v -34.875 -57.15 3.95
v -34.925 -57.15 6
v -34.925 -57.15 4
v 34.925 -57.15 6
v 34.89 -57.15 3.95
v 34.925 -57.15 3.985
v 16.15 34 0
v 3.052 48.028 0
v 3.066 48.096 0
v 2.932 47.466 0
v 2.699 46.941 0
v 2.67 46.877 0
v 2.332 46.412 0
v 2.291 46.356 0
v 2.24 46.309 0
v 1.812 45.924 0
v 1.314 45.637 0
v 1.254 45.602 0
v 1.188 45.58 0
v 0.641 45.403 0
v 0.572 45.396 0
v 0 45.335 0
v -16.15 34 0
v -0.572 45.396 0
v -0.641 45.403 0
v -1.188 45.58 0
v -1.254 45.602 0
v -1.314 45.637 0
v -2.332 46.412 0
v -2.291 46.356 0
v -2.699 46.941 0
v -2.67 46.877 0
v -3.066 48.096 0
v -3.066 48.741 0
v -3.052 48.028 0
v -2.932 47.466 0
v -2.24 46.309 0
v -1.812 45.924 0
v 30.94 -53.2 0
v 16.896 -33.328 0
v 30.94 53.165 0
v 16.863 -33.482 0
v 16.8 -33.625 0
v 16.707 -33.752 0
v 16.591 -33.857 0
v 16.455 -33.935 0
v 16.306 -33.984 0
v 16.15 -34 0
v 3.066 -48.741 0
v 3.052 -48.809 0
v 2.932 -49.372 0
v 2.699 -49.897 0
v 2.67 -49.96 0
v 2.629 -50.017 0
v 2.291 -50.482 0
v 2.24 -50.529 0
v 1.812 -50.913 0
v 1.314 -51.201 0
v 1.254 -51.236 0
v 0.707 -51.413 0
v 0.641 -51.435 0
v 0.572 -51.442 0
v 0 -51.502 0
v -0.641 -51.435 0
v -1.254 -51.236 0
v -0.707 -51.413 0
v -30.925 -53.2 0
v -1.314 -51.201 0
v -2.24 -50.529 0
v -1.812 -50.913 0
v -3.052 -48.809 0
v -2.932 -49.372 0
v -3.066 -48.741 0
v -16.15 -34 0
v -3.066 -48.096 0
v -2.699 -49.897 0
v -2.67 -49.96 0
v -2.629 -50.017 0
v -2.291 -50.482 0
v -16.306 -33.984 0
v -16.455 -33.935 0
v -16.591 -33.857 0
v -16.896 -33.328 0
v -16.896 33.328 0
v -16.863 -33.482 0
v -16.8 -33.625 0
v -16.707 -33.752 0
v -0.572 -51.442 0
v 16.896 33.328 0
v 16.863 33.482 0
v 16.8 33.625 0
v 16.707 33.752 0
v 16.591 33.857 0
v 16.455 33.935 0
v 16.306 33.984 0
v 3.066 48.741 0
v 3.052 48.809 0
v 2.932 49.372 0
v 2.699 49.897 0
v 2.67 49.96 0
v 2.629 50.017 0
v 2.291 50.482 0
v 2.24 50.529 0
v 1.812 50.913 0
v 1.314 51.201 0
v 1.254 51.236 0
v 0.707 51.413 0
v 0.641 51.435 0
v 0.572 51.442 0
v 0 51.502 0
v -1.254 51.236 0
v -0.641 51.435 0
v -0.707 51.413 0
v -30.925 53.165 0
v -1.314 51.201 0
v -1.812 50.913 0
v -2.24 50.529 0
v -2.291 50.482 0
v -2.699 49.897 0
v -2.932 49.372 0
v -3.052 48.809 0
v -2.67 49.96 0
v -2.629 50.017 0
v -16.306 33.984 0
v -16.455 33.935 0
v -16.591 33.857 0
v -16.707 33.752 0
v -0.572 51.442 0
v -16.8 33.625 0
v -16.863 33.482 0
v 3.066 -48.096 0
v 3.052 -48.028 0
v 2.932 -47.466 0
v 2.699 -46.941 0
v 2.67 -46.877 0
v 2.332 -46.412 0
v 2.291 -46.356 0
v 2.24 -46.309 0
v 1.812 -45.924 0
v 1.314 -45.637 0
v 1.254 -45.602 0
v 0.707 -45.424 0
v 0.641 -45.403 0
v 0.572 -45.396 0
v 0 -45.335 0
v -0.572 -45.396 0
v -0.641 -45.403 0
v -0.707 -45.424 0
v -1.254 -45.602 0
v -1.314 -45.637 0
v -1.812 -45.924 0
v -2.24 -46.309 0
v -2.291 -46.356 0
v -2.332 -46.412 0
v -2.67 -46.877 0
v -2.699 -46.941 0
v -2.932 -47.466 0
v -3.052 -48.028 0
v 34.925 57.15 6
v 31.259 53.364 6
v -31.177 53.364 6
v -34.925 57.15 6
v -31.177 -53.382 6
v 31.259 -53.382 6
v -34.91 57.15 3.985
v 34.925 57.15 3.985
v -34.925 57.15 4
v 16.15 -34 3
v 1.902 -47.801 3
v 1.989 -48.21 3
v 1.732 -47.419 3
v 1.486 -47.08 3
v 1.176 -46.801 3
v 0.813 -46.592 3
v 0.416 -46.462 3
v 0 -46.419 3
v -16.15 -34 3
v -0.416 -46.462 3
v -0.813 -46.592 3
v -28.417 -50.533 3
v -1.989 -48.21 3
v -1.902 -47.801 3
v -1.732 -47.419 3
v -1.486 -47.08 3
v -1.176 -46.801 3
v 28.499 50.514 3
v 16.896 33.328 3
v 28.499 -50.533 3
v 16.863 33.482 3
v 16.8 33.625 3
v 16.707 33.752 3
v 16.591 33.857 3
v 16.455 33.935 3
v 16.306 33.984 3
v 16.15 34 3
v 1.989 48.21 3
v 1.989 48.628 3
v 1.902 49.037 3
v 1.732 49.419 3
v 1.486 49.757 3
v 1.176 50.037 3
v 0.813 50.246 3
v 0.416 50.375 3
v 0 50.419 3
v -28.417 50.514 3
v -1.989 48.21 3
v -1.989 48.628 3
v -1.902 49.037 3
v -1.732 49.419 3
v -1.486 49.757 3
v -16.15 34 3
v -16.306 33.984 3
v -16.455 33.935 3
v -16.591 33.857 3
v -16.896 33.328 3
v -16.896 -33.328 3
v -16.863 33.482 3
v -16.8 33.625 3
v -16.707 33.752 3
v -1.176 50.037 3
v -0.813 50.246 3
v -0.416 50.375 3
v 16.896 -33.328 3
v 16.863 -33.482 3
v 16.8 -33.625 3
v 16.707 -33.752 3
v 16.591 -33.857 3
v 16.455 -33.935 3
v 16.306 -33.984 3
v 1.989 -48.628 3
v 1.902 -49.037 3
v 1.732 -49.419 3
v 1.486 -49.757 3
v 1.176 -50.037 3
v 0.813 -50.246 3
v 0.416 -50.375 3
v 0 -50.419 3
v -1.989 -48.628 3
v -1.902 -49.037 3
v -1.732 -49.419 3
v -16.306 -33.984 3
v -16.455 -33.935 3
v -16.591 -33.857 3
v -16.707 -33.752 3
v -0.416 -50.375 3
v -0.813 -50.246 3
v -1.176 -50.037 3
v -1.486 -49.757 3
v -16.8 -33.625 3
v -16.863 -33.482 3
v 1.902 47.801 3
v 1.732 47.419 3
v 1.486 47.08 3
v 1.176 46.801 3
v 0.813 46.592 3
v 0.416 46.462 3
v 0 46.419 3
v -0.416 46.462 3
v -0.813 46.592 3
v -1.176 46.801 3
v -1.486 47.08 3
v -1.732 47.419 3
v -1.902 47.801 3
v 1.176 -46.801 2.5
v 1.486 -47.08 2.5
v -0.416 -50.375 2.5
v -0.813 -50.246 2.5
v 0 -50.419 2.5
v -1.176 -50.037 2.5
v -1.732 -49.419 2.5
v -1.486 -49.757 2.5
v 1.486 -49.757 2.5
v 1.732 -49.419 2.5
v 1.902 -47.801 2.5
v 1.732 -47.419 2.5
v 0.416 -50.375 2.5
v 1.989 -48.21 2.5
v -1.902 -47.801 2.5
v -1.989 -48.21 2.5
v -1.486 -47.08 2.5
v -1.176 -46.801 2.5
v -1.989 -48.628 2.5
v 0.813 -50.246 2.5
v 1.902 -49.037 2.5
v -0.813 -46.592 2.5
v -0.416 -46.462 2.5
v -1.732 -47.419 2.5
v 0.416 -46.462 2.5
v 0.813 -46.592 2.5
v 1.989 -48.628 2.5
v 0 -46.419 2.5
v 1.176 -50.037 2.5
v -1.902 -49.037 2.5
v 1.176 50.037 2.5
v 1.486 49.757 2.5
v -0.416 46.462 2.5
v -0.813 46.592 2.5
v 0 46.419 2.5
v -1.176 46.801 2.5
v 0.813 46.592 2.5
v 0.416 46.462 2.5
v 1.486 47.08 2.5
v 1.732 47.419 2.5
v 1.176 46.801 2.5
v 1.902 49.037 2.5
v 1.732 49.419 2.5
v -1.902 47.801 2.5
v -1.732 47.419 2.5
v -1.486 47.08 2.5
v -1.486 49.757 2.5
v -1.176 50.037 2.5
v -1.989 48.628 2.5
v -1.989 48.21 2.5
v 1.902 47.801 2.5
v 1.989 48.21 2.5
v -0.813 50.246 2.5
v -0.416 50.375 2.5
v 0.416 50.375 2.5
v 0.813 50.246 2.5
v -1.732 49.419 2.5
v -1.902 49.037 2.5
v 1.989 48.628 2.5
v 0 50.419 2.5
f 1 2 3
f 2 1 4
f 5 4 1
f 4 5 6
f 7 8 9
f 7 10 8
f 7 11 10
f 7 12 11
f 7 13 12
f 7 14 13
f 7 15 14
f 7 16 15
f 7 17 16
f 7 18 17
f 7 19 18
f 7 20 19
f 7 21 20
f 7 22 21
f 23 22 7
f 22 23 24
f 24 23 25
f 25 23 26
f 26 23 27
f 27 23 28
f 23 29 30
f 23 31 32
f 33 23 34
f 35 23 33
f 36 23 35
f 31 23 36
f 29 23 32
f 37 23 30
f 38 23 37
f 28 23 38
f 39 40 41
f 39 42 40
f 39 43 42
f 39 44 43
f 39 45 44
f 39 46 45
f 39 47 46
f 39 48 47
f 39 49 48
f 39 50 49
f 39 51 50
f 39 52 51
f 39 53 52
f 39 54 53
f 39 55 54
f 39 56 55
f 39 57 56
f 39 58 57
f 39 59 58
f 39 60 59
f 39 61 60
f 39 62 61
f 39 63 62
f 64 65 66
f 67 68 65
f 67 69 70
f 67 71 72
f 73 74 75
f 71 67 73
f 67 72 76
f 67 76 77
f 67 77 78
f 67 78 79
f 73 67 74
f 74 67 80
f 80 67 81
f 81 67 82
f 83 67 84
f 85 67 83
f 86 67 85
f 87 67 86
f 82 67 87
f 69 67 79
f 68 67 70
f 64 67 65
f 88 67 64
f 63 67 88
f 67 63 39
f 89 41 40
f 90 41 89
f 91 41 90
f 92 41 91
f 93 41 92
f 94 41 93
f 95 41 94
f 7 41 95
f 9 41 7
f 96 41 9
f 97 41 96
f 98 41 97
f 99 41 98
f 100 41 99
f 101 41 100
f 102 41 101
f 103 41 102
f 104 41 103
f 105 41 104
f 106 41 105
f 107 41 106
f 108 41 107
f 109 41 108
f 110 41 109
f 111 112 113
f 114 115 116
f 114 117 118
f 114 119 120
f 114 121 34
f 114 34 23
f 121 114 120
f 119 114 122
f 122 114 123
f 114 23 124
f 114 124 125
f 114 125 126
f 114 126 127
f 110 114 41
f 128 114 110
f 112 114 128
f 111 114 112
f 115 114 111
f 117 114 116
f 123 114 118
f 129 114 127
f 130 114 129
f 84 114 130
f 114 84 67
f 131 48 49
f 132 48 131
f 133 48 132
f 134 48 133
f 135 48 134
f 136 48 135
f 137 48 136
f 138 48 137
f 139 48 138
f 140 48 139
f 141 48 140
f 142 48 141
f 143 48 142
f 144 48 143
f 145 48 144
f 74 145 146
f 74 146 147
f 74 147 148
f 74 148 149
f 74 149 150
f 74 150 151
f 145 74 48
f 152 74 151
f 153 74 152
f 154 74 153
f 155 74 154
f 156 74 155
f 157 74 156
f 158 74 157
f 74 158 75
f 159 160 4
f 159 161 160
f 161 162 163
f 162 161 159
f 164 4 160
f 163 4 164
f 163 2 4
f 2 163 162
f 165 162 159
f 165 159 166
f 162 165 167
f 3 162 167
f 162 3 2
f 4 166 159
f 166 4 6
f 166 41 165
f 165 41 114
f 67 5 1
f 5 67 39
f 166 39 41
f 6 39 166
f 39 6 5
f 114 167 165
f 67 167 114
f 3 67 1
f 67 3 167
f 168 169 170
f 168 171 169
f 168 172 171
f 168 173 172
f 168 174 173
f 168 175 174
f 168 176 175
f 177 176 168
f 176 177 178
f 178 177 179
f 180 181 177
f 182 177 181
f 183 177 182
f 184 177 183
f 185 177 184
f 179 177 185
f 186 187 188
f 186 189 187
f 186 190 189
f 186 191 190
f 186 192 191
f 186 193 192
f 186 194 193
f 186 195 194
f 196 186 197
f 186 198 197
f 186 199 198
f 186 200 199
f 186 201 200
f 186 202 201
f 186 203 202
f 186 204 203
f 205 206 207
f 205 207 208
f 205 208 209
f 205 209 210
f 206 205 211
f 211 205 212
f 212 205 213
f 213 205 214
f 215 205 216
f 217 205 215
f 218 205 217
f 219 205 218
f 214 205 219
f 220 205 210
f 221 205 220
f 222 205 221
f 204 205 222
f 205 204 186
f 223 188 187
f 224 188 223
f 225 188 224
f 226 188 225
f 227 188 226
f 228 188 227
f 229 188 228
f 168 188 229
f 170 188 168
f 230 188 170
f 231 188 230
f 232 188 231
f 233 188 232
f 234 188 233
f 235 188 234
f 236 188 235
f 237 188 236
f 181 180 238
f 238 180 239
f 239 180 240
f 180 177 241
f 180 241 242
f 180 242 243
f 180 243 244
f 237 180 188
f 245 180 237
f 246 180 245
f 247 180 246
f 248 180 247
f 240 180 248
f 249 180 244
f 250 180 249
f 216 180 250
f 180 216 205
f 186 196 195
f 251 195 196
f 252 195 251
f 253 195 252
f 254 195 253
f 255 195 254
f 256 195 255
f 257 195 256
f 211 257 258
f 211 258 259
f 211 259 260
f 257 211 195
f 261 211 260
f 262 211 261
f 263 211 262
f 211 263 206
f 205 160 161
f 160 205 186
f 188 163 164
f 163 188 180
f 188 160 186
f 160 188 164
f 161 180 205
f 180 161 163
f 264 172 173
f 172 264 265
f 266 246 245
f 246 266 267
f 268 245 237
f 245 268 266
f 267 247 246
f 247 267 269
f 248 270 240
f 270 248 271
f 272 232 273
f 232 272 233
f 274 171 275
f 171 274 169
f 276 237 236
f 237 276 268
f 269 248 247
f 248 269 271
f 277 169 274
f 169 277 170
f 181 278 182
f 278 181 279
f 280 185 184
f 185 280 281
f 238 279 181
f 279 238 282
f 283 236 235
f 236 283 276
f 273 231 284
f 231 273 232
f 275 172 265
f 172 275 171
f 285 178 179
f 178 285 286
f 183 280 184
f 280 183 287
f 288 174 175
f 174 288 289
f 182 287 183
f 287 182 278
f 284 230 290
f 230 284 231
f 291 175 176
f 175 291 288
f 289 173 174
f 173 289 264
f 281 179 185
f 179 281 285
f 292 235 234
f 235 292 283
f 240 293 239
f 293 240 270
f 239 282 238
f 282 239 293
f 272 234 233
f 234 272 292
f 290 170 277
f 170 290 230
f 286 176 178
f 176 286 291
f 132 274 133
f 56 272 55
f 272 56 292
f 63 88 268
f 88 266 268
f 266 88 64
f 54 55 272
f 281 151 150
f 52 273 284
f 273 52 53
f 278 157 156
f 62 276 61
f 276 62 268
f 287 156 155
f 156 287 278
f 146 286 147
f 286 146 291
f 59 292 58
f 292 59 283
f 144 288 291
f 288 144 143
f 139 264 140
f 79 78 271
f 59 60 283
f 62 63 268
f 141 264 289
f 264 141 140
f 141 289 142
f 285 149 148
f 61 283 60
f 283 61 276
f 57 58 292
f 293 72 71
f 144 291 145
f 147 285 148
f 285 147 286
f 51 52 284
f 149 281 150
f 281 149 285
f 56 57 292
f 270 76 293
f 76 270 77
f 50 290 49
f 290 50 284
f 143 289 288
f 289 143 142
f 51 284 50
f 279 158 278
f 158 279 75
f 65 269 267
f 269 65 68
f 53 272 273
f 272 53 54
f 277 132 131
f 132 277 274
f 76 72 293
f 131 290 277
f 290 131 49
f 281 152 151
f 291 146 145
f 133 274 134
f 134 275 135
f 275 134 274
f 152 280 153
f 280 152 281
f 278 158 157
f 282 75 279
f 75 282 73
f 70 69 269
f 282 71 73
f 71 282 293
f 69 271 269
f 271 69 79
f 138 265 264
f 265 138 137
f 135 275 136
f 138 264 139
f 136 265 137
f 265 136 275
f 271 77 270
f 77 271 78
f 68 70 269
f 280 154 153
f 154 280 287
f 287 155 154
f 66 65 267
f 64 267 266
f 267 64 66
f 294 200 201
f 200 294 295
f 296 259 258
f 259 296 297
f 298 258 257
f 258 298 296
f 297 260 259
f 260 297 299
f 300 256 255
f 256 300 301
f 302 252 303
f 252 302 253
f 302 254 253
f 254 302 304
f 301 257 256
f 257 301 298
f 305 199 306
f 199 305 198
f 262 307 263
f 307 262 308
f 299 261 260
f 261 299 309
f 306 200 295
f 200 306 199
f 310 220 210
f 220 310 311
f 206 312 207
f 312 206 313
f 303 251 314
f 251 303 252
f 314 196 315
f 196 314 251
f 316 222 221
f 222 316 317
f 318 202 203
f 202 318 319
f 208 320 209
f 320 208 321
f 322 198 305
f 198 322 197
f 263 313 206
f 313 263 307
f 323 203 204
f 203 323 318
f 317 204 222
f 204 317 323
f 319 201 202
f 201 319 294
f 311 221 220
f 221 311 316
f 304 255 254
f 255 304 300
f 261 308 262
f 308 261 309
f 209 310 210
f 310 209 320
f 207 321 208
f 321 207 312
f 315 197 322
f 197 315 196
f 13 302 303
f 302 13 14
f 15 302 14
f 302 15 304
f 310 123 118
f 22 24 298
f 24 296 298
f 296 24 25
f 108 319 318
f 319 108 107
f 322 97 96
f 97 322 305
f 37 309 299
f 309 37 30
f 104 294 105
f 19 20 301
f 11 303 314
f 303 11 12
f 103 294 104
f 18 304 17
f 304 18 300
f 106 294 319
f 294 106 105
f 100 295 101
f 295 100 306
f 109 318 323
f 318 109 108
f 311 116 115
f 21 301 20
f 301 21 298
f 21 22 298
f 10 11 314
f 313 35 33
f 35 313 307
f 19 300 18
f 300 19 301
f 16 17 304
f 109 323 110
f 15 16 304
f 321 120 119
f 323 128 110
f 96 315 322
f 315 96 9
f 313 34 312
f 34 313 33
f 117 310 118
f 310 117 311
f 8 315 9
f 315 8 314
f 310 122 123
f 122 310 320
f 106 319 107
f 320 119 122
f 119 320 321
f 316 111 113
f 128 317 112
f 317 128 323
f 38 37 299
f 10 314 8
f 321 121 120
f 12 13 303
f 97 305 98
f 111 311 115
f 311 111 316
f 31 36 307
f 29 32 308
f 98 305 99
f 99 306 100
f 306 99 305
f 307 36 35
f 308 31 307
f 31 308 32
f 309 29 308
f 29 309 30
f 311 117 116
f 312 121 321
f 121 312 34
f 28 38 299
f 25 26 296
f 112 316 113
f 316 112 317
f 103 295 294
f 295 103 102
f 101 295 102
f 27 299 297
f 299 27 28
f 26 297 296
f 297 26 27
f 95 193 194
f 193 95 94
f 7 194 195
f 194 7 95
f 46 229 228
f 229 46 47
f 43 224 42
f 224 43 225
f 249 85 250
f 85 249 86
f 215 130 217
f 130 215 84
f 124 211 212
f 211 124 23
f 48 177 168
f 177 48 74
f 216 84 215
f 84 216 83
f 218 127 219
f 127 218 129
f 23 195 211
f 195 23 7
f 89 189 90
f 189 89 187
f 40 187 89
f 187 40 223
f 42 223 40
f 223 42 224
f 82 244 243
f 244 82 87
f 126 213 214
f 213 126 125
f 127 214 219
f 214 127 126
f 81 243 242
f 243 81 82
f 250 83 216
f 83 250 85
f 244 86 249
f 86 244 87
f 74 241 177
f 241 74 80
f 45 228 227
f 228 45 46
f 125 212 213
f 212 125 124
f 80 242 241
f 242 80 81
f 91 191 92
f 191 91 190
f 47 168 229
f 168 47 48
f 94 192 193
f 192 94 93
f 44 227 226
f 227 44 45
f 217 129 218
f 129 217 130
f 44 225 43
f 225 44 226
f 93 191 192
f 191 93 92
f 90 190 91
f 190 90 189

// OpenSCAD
// WALLY - Wall Plate Customizer v1.4
// by TheNewHobbyist 2013 (http://thenewhobbyist.com)
// http://www.thingiverse.com/thing:47956
//
// Most of the connectors used with this thing are panel mount connectors from
// www.DataPro.net I can't vouch for their quality but they did have easy to
// find dimensions for their products so I used them.
//
// This could be tightened up considerably but I thought I'd get it out there for people
// to experiment with before I lose my mind staring at it too long. Also this is my
// first OpenSCAD model so cut me some slack ;)
//
//   Notes:
//
// * The plug types "Duplex Outlet", "Long_Toggle Switch", "Toggle Switch", and "Rocker"
//   will all use the entire plate when selected in top or bottom configuration. The
//   other selection (if not "none" will be selected).
//
// * "None" and "Blank should not be considered equal. if "None" is selected for one of
//   the two holes on a plate the other selection will be centered on that plate. If
//   "Blank" is selected that plug location will remain blank but the other selection
//   will NOT move into a centered position.
//
//	Change Log:
//
//	v1.1
//	UPDATED: Screw hole locations for designer and toggle plate types.
//	UPDATED: Hole size for designer plate type.
//	UPDATED: Outlet hole spacing
//
//	v1.2
//	ADDED: Long Toggle Switch for laird
//
//	v1.3
//	ADDED: 3 new sizes for plate export: Standard, Junior-Jumbo, and Jumbo.
//
//	v1.3a
//	ADDED: Keystone jack pair
//
//	v1.3b
//	ADDED: whole-plate 2x3 array of Keystone jacks
//
//  v1.4 by rssalerno
//  ADDED: 1x3 array of Keystone jacks
//  FIXED: bugs in plates 4 and 5
//
//  v1.41.1 by rssalerno
//  UPDATED: cleaned up a bit
//  UPDATED: revised keystone frame for easier insertion, same frame now used for all configurations
//  ADDED: keystone clearance parameter to adjust fit
//  UPDATED: adjusted keystone column spacing, now distributes evenly across 2+ gangs
//  UPDATED: changed rocker opening to rounded rectangle

  //////////////////////////
 // Customizer Settings: //
//////////////////////////

//How big are we talkin' here?
plate_width = 1; //	[1:5]

// Bigger hole in your wall? Try this
plate_size = 0; // [0:Standard, 1:Junior-Jumbo, 2:Jumbo]

//Pick a plug or full plate type
1st_plate = "rocker";  //	["none":None, "blank":Blank Port, "toggle":Full Plate - Toggle Switch, "long_toggle":Full Plate - Long Toggle Switch, "outlet":Full Plate - Duplex Outlet, "rocker":Full Plate - Rocker/Designer Plate, "keystone1":Keystone Jack, "keystone2":Keystone Jack Pair, "keystone3":1x3 Keystone Jack array, "keystone6":2x3 Keystone Jack array, "vga":VGA Port, "hdmi":HDMI Port, "dvi":DVI-I Port, "displayport":Displayport, "cat5e":Cat5e/Cat6 Port, "usb-a":USB-A Port, "usb-b":USB-B Port, "firewire":Firewire IEEE 1394 Port, "db09":DB-09 Port, "ps2":PS2 Port, "f-type": F-Type/Coaxial Port,"svideo":S-Video Port, "stereo":Stereo Headphone Jack]
//Pick a bottom plug type or leave as none
1st_plate_bottom_hole = "none";  //	["none":None, "blank":Blank Port, "keystone1":Keystone Jack, "keystone2":Keystone Jack Pair, "vga":VGA Port, "hdmi":HDMI Port, "dvi":DVI-I Port, "displayport":Displayport, "cat5e":Cat5e/Cat6 Port, "usb-a":USB-A Port, "usb-b":USB-B Port, "firewire":Firewire IEEE 1394 Port, "db09":DB-09 Port, "ps2":PS2 Port, "f-type": F-Type/Coaxial Port,"svideo":S-Video Port, "stereo":Stereo Headphone Jack]
//Pick a plug or full plate type
2nd_plate = "none";  //	["none":None, "blank":Blank Port, "toggle":Full Plate - Toggle Switch, "long_toggle":Full Plate - Long Toggle Switch, "outlet":Full Plate - Duplex Outlet, "rocker":Full Plate - Rocker/Designer Plate, "keystone1":Keystone Jack, "keystone2":Keystone Jack Pair, "keystone3":1x3 Keystone Jack array, "keystone6":2x3 Keystone Jack array, "vga":VGA Port, "hdmi":HDMI Port, "dvi":DVI-I Port, "displayport":Displayport, "cat5e":Cat5e/Cat6 Port, "usb-a":USB-A Port, "usb-b":USB-B Port, "firewire":Firewire IEEE 1394 Port, "db09":DB-09 Port, "ps2":PS2 Port, "f-type": F-Type/Coaxial Port,"svideo":S-Video Port, "stereo":Stereo Headphone Jack]
//Pick a bottom plug type or leave as none
2nd_plate_bottom_hole = "none";  //	["none":None, "blank":Blank Port, "keystone1":Keystone Jack, "keystone2":Keystone Jack Pair, "vga":VGA Port, "hdmi":HDMI Port, "dvi":DVI-I Port, "displayport":Displayport, "cat5e":Cat5e/Cat6 Port, "usb-a":USB-A Port, "usb-b":USB-B Port, "firewire":Firewire IEEE 1394 Port, "db09":DB-09 Port, "ps2":PS2 Port, "f-type": F-Type/Coaxial Port,"svideo":S-Video Port, "stereo":Stereo Headphone Jack]
//Pick a plug or full plate type
3rd_plate = "none";  //	["none":None, "blank":Blank Port, "toggle":Full Plate - Toggle Switch, "long_toggle":Full Plate - Long Toggle Switch, "outlet":Full Plate - Duplex Outlet, "rocker":Full Plate - Rocker/Designer Plate, "keystone1":Keystone Jack, "keystone2":Keystone Jack Pair, "keystone3":1x3 Keystone Jack array, "keystone6":2x3 Keystone Jack array, "vga":VGA Port, "hdmi":HDMI Port, "dvi":DVI-I Port, "displayport":Displayport, "cat5e":Cat5e/Cat6 Port, "usb-a":USB-A Port, "usb-b":USB-B Port, "firewire":Firewire IEEE 1394 Port, "db09":DB-09 Port, "ps2":PS2 Port, "f-type": F-Type/Coaxial Port,"svideo":S-Video Port, "stereo":Stereo Headphone Jack]
//Pick a bottom plug type or leave as none
3rd_plate_bottom_hole = "none";  //	["none":None, "blank":Blank Port, "keystone1":Keystone Jack, "keystone2":Keystone Jack Pair, "vga":VGA Port, "hdmi":HDMI Port, "dvi":DVI-I Port, "displayport":Displayport, "cat5e":Cat5e/Cat6 Port, "usb-a":USB-A Port, "usb-b":USB-B Port, "firewire":Firewire IEEE 1394 Port, "db09":DB-09 Port, "ps2":PS2 Port, "f-type": F-Type/Coaxial Port,"svideo":S-Video Port, "stereo":Stereo Headphone Jack]
//Pick a plug or full plate type
4th_plate = "none";  //["none":None, "blank":Blank Port, "toggle":Full Plate - Toggle Switch, "long_toggle":Full Plate - Long Toggle Switch, "outlet":Full Plate - Duplex Outlet, "rocker":Full Plate - Rocker/Designer Plate, "keystone1":Keystone Jack, "keystone2":Keystone Jack Pair, "keystone3":1x3 Keystone Jack array, "keystone6":2x3 Keystone Jack array, "vga":VGA Port, "hdmi":HDMI Port, "dvi":DVI-I Port, "displayport":Displayport, "cat5e":Cat5e/Cat6 Port, "usb-a":USB-A Port, "usb-b":USB-B Port, "firewire":Firewire IEEE 1394 Port, "db09":DB-09 Port, "ps2":PS2 Port, "f-type": F-Type/Coaxial Port,"svideo":S-Video Port, "stereo":Stereo Headphone Jack]
//Pick a bottom plug type or leave as none
4th_plate_bottom_hole = "none";  //	["none":None, "blank":Blank Port, "keystone1":Keystone Jack, "keystone2":Keystone Jack Pair, "vga":VGA Port, "hdmi":HDMI Port, "dvi":DVI-I Port, "displayport":Displayport, "cat5e":Cat5e/Cat6 Port, "usb-a":USB-A Port, "usb-b":USB-B Port, "firewire":Firewire IEEE 1394 Port, "db09":DB-09 Port, "ps2":PS2 Port, "f-type": F-Type/Coaxial Port,"svideo":S-Video Port, "stereo":Stereo Headphone Jack]
//Pick a plug or full plate type
5th_plate = "none";  //["none":None, "blank":Blank Port, "toggle":Full Plate - Toggle Switch, "long_toggle":Full Plate - Long Toggle Switch, "outlet":Full Plate - Duplex Outlet, "rocker":Full Plate - Rocker/Designer Plate, "keystone1":Keystone Jack, "keystone2":Keystone Jack Pair, "keystone3":1x3 Keystone Jack array, "keystone6":2x3 Keystone Jack array, "vga":VGA Port, "hdmi":HDMI Port, "dvi":DVI-I Port, "displayport":Displayport, "cat5e":Cat5e/Cat6 Port, "usb-a":USB-A Port, "usb-b":USB-B Port, "firewire":Firewire IEEE 1394 Port, "db09":DB-09 Port, "ps2":PS2 Port, "f-type": F-Type/Coaxial Port,"svideo":S-Video Port, "stereo":Stereo Headphone Jack]
//Pick a bottom plug type or leave as none
5th_plate_bottom_hole = "none";  //	["none":None, "blank":Blank Port, "keystone1":Keystone Jack, "keystone2":Keystone Jack Pair, "vga":VGA Port, "hdmi":HDMI Port, "dvi":DVI-I Port, "displayport":Displayport, "cat5e":Cat5e/Cat6 Port, "usb-a":USB-A Port, "usb-b":USB-B Port, "firewire":Firewire IEEE 1394 Port, "db09":DB-09 Port, "ps2":PS2 Port, "f-type": F-Type/Coaxial Port,"svideo":S-Video Port, "stereo":Stereo Headphone Jack]

  //////////////////////
 // Static Settings: //
//////////////////////

module GoAwayCustomizer() {
// This module is here to stop Customizer from picking up the variables below
}

l_offset = [34.925,39.6875,44.45];
r_offset = [34.925,39.6875,44.45];
spacer = [0,0,46.0375,92.075,138.1125,184.15];
solid_plate_width = l_offset[plate_size] + spacer[plate_width] + r_offset[plate_size];

height_sizes = [114.3,123.825,133.35];

height = 114.3; //plate height (static)
gang_width=[0,69.86,115.824,161.925,206.375,254]; // Plate widths (standard)

edgewidth = solid_plate_width + 10; // Bevel setting for top and bottom
rightbevel = solid_plate_width - 4; // Bevel for right side (scales)

left_offset = 34.925; // Offset first hole position
switch_offset = 46.0375; // Offset all additional holes
thinner_offset=[0,0.92,0.95,0.96,0.97,0.973]; // Manual fix for right side wackiness

positions=[height_sizes[plate_size]/2,height_sizes[plate_size]/2 - 14.25,height_sizes[plate_size]/2 + 14.25];

// keystone-related parameters
keystone_clearance = 0.2;
keystone_height = 16.5 + keystone_clearance;
keystone_width = 15 + keystone_clearance;
keystone_column_offset = 11.5;

// rocker and Insteon mini remote-related parameters
rocker_openingX = 33.8;
rocker_openingY = 68.0;
rocker_opening_cornerR = 0.75;

$fn=30;

// preview[view:north, tilt:bottom]

  ///////////////////
 // Hole Control: //
///////////////////

module plate1(){
	if (1st_plate == "toggle" || 1st_plate_bottom_hole == "toggle"){
		translate([0,l_offset[plate_size],0]) toggle_screws();
		translate([0,l_offset[plate_size],0]) hole("toggle");
		}
	else if (1st_plate == "long_toggle" || 1st_plate_bottom_hole == "long_toggle"){
		translate([0,l_offset[plate_size],0]) toggle_screws();
		translate([0,l_offset[plate_size],0]) hole("long_toggle");
		}
	else if (1st_plate == "rocker" || 1st_plate_bottom_hole == "rocker"){
		translate([0,l_offset[plate_size],0]) rocker_screws();
		translate([0,l_offset[plate_size],0]) hole("rocker");
		}
	else if (1st_plate == "outlet" || 1st_plate_bottom_hole == "outlet") {
	translate([0,l_offset[plate_size],0]) hole("outlet");
	}
	else if (1st_plate_bottom_hole == "none") {
		translate([0,l_offset[plate_size],0]) box_screws();
		translate([positions[0],l_offset[plate_size],0]) hole(1st_plate);
			}
	else if (1st_plate == "none") {
		translate([0,l_offset[plate_size],0]) box_screws();
		translate([positions[0],l_offset[plate_size],0]) hole(1st_plate_bottom_hole);
			}
	else {
	translate([0,l_offset[plate_size],0]) box_screws();
	translate([positions[1],l_offset[plate_size],0]) hole(1st_plate);
	translate([positions[2],l_offset[plate_size],0]) hole(1st_plate_bottom_hole);
	}
}

module plate2(){
	if (2nd_plate == "toggle" || 2nd_plate_bottom_hole == "toggle"){
		translate([0,l_offset[plate_size] + switch_offset,0]) toggle_screws();
		translate([0,l_offset[plate_size] + switch_offset,0]) hole("toggle");
		}
	else if (2nd_plate == "long_toggle" || 2nd_plate_bottom_hole == "long_toggle"){
		translate([0,l_offset[plate_size] + switch_offset,0]) toggle_screws();
		translate([0,l_offset[plate_size] + switch_offset,0]) hole("long_toggle");
		}
	else if (2nd_plate == "rocker" || 2nd_plate_bottom_hole == "rocker"){
		translate([0,l_offset[plate_size] + switch_offset,0]) rocker_screws();
		translate([0,l_offset[plate_size] + switch_offset,0]) hole("rocker");
		}
	else if (2nd_plate == "outlet" || 2nd_plate_bottom_hole == "outlet") {
	translate([0,l_offset[plate_size] + switch_offset,0]) hole("outlet");
	}
	else if (2nd_plate_bottom_hole == "none") {
		translate([0,l_offset[plate_size] + switch_offset,0]) box_screws();
		translate([positions[0],l_offset[plate_size] + switch_offset,0]) hole(2nd_plate);
			}
	else if (2nd_plate == "none") {
		translate([0,l_offset[plate_size] + switch_offset,0]) box_screws();
		translate([positions[0],l_offset[plate_size] + switch_offset,0]) hole(2nd_plate_bottom_hole);
			}
	else {
	translate([0,l_offset[plate_size] + switch_offset,0]) box_screws();
	translate([positions[1],l_offset[plate_size] + switch_offset,0]) hole(2nd_plate);
	translate([positions[2],l_offset[plate_size] + switch_offset,0]) hole(2nd_plate_bottom_hole);
	}
}

module plate3(){
	if (3rd_plate == "toggle" || 3rd_plate_bottom_hole == "toggle"){
		translate([0,l_offset[plate_size] + switch_offset * 2,0]) toggle_screws();
		translate([0,l_offset[plate_size] + switch_offset * 2,0]) hole("toggle");
		}
	else if (3rd_plate == "long_toggle" || 3rd_plate_bottom_hole == "long_toggle"){
		translate([0,l_offset[plate_size] + switch_offset * 2,0]) toggle_screws();
		translate([0,l_offset[plate_size] + switch_offset * 2,0]) hole("long_toggle");
		}
	else if (3rd_plate == "rocker" || 3rd_plate_bottom_hole == "rocker"){
		translate([0,l_offset[plate_size] + switch_offset * 2,0]) rocker_screws();
		translate([0,l_offset[plate_size] + switch_offset * 2,0]) hole("rocker");
		}
	else if (3rd_plate == "outlet" || 3rd_plate_bottom_hole == "outlet") {
	translate([0,l_offset[plate_size] + switch_offset * 2,0]) hole("outlet");
	}
	else if (3rd_plate_bottom_hole == "none") {
		translate([0,l_offset[plate_size] + switch_offset * 2,0]) box_screws();
		translate([positions[0],l_offset[plate_size] + switch_offset * 2,0]) hole(3rd_plate);
			}
	else if (3rd_plate == "none") {
		translate([0,l_offset[plate_size] + switch_offset * 2,0]) box_screws();
		translate([positions[0],l_offset[plate_size] + switch_offset * 2,0]) hole(3rd_plate_bottom_hole);
			}
	else {
	translate([0,l_offset[plate_size] + switch_offset * 2,0]) box_screws();
	translate([positions[1],l_offset[plate_size] + switch_offset * 2,0]) hole(3rd_plate);
	translate([positions[2],l_offset[plate_size] + switch_offset * 2,0]) hole(3rd_plate_bottom_hole);
	}
}

module plate4(){
	if (4th_plate == "toggle" || 5th_plate_bottom_hole == "toggle"){
		translate([0,l_offset[plate_size] + switch_offset * 3,0]) toggle_screws();
		translate([0,l_offset[plate_size] + switch_offset * 3,0]) hole("toggle");
		}
	else if (4th_plate == "long_toggle" || 5th_plate_bottom_hole == "long_toggle"){
		translate([0,l_offset[plate_size] + switch_offset * 3,0]) toggle_screws();
		translate([0,l_offset[plate_size] + switch_offset * 3,0]) hole("long_toggle");
		}
	else if (4th_plate == "rocker" || 5th_plate_bottom_hole == "rocker"){
		translate([0,l_offset[plate_size] + switch_offset * 3,0]) rocker_screws();
		translate([0,l_offset[plate_size] + switch_offset * 3,0]) hole("rocker");
		}
	else if (4th_plate == "outlet" || 5th_plate_bottom_hole == "outlet") {
	translate([0,l_offset[plate_size] + switch_offset * 3,0]) hole("outlet");
	}
	else if (4th_plate_bottom_hole == "none") {
		translate([0,l_offset[plate_size] + switch_offset * 3,0]) box_screws();
		translate([positions[0],l_offset[plate_size] + switch_offset * 3,0]) hole(4th_plate);
			}
	else if (4th_plate == "none") {
		translate([0,l_offset[plate_size] + switch_offset * 3,0]) box_screws();
		translate([positions[0],l_offset[plate_size] + switch_offset * 3,0]) hole(4th_plate_bottom_hole);
			}
	else {
	translate([0,l_offset[plate_size] + switch_offset * 3,0]) box_screws();
	translate([positions[1],l_offset[plate_size] + switch_offset * 3,0]) hole(4th_plate);
	translate([positions[2],l_offset[plate_size] + switch_offset * 3,0]) hole(4th_plate_bottom_hole);
	}
}

module plate5(){
	if (5th_plate == "toggle" || 5th_plate_bottom_hole == "toggle"){
		translate([0,l_offset[plate_size] + switch_offset * 4,0]) toggle_screws();
		translate([0,l_offset[plate_size] + switch_offset * 4,0]) hole("toggle");
		}
	else if (5th_plate == "long_toggle" || 5th_plate_bottom_hole == "long_toggle"){
		translate([0,l_offset[plate_size] + switch_offset * 4,0]) toggle_screws();
		translate([0,l_offset[plate_size] + switch_offset * 4,0]) hole("long_toggle");
		}
	else if (5th_plate == "rocker" || 5th_plate_bottom_hole == "rocker"){
		translate([0,l_offset[plate_size] + switch_offset * 4,0]) rocker_screws();
		translate([0,l_offset[plate_size] + switch_offset * 4,0]) hole("rocker");
		}
	else if (5th_plate == "outlet" || 5th_plate_bottom_hole == "outlet") {
	translate([0,l_offset[plate_size] + switch_offset * 4,0]) hole("outlet");
	}
	else if (5th_plate_bottom_hole == "none") {
		translate([0,l_offset[plate_size] + switch_offset * 4,0]) box_screws();
		translate([positions[0],l_offset[plate_size] + switch_offset * 4,0]) hole(5th_plate);
			}
	else if (5th_plate == "none") {
		translate([0,l_offset[plate_size] + switch_offset * 4,0]) box_screws();
		translate([positions[0],l_offset[plate_size] + switch_offset * 4,0]) hole(5th_plate_bottom_hole);
			}
	else {
	translate([0,l_offset[plate_size] + switch_offset * 4,0]) box_screws();
	translate([positions[1],l_offset[plate_size] + switch_offset * 4,0]) hole(5th_plate);
	translate([positions[2],l_offset[plate_size] + switch_offset * 4,0]) hole(5th_plate_bottom_hole);
	}
}

  /////////////////
 // SolidWorks: //
/////////////////

module plate1_solid(){
if (1st_plate == "keystone1" && 1st_plate_bottom_hole == "none") {
	translate([height_sizes[plate_size]/2 + 14.3,l_offset[plate_size] - 11.5,-3.9]) hole("keystone_solid");
	}
else if (1st_plate == "keystone1" && 1st_plate_bottom_hole != "outlet" && 1st_plate_bottom_hole != "toggle" && 1st_plate_bottom_hole != "rocker") {
	translate([height_sizes[plate_size]/2,l_offset[plate_size] - 11.5,-3.9]) hole("keystone_solid");
	}
else if (1st_plate == "keystone2" && 1st_plate_bottom_hole == "none") {
	translate([height_sizes[plate_size]/2 + 14.3,l_offset[plate_size] - 11.5,-3.9]) hole("keystone2_solid");
	}
else if (1st_plate == "keystone2" && 1st_plate_bottom_hole != "outlet" && 1st_plate_bottom_hole != "toggle" && 1st_plate_bottom_hole != "rocker") {
	translate([height_sizes[plate_size]/2,l_offset[plate_size] - 11.5,-3.9]) hole("keystone2_solid");
	}
else if (1st_plate == "keystone3" && 1st_plate_bottom_hole == "none") {
	translate([height_sizes[plate_size]/2 + 14.3,l_offset[plate_size] - 11.5,-3.9]) hole("keystone3_solid");
	}
else if (1st_plate == "keystone6" && 1st_plate_bottom_hole == "none") {
	translate([height_sizes[plate_size]/2 + 14.3,l_offset[plate_size] - 11.5,-3.9]) hole("keystone6_solid");
	}
if (1st_plate_bottom_hole == "keystone1" && 1st_plate == "none") {
	translate([height_sizes[plate_size]/2 + 14.3,l_offset[plate_size] - 11.5,-3.9]) hole("keystone_solid");
	}
if (1st_plate_bottom_hole == "keystone2" && 1st_plate == "none") {
	translate([height_sizes[plate_size]/2 + 14.3,l_offset[plate_size] - 11.5,-3.9]) hole("keystone2_solid");
	}
else if (1st_plate_bottom_hole == "keystone1" && 1st_plate != "outlet" && 1st_plate != "toggle" && 1st_plate != "rocker") {
	translate([height_sizes[plate_size]/2 + 28.5,l_offset[plate_size] - 11.5,-3.9]) hole("keystone_solid");
	}
else if (1st_plate_bottom_hole == "keystone2" && 1st_plate != "outlet" && 1st_plate != "toggle" && 1st_plate != "rocker") {
	translate([height_sizes[plate_size]/2 + 28.5,l_offset[plate_size] - 11.5,-3.9]) hole("keystone2_solid");
	}
}

module plate2_solid(){
if (2nd_plate == "keystone1" && 2nd_plate_bottom_hole == "none") {
	translate([height_sizes[plate_size]/2 + 14.3,l_offset[plate_size] - 11.5 + switch_offset,-3.9]) hole("keystone_solid");
	}
else if (2nd_plate == "keystone1" && 2nd_plate_bottom_hole != "outlet" && 2nd_plate_bottom_hole != "toggle" && 2nd_plate_bottom_hole != "rocker") {
	translate([height_sizes[plate_size]/2,l_offset[plate_size] - 11.5 + switch_offset,-3.9]) hole("keystone_solid");
	}
else if (2nd_plate == "keystone2" && 2nd_plate_bottom_hole == "none") {
	translate([height_sizes[plate_size]/2 + 14.3,l_offset[plate_size] - 11.5 + switch_offset,-3.9]) hole("keystone2_solid");
	}
else if (2nd_plate == "keystone2" && 2nd_plate_bottom_hole != "outlet" && 2nd_plate_bottom_hole != "toggle" && 2nd_plate_bottom_hole != "rocker") {
	translate([height_sizes[plate_size]/2,l_offset[plate_size] - 11.5 + switch_offset,-3.9]) hole("keystone2_solid");
	}
else if (2nd_plate == "keystone3" && 2nd_plate_bottom_hole == "none") {
	translate([height_sizes[plate_size]/2 + 14.3,l_offset[plate_size] - 11.5 + switch_offset,-3.9]) hole("keystone3_solid");
	}
else if (2nd_plate == "keystone6" && 2nd_plate_bottom_hole == "none") {
	translate([height_sizes[plate_size]/2 + 14.3,l_offset[plate_size] - 11.5 + switch_offset,-3.9]) hole("keystone6_solid");
	}
if (2nd_plate_bottom_hole == "keystone1" && 2nd_plate == "none") {
	translate([height_sizes[plate_size]/2 + 14.3,l_offset[plate_size] - 11.5 + switch_offset,-3.9]) hole("keystone_solid");
	}
if (2nd_plate_bottom_hole == "keystone2" && 2nd_plate == "none") {
	translate([height_sizes[plate_size]/2 + 14.3,l_offset[plate_size] - 11.5 + switch_offset,-3.9]) hole("keystone2_solid");
	}
else if (2nd_plate_bottom_hole == "keystone1" && 2nd_plate != "outlet" && 2nd_plate != "toggle" && 2nd_plate != "rocker") {
	translate([height_sizes[plate_size]/2 + 28.5,l_offset[plate_size] - 11.5 + switch_offset,-3.9]) hole("keystone_solid");
	}
else if (2nd_plate_bottom_hole == "keystone2" && 2nd_plate != "outlet" && 2nd_plate != "toggle" && 2nd_plate != "rocker") {
	translate([height_sizes[plate_size]/2 + 28.5,l_offset[plate_size] - 11.5 + switch_offset,-3.9]) hole("keystone2_solid");
	}
}

module plate3_solid(){
if (3rd_plate == "keystone1" && 3rd_plate_bottom_hole == "none") {
	translate([height_sizes[plate_size]/2 + 14.3,l_offset[plate_size] - 11.5 + switch_offset * 2,-3.9]) hole("keystone_solid");
	}
else if (3rd_plate == "keystone1" && 3rd_plate_bottom_hole != "outlet" && 3rd_plate_bottom_hole != "toggle" && 3rd_plate_bottom_hole != "rocker") {
	translate([height_sizes[plate_size]/2,l_offset[plate_size] - 11.5 + switch_offset * 2,-3.9]) hole("keystone_solid");
	}
else if (3rd_plate == "keystone2" && 3rd_plate_bottom_hole == "none") {
	translate([height_sizes[plate_size]/2 + 14.3,l_offset[plate_size] - 11.5 + switch_offset * 2,-3.9]) hole("keystone2_solid");
	}
else if (3rd_plate == "keystone2" && 3rd_plate_bottom_hole != "outlet" && 3rd_plate_bottom_hole != "toggle" && 3rd_plate_bottom_hole != "rocker") {
	translate([height_sizes[plate_size]/2,l_offset[plate_size] - 11.5 + switch_offset * 2,-3.9]) hole("keystone2_solid");
	}
else if (3rd_plate == "keystone3" && 3rd_plate_bottom_hole == "none") {
	translate([height_sizes[plate_size]/2 + 14.3,l_offset[plate_size] - 11.5 + switch_offset * 2,-3.9]) hole("keystone3_solid");
	}
else if (3rd_plate == "keystone6" && 3rd_plate_bottom_hole == "none") {
	translate([height_sizes[plate_size]/2 + 14.3,l_offset[plate_size] - 11.5 + switch_offset * 2,-3.9]) hole("keystone6_solid");
	}
if (3rd_plate_bottom_hole == "keystone1" && 3rd_plate == "none") {
	translate([height_sizes[plate_size]/2 + 14.3,l_offset[plate_size] - 11.5 + switch_offset * 2,-3.9]) hole("keystone_solid");
	}
if (3rd_plate_bottom_hole == "keystone2" && 3rd_plate == "none") {
	translate([height_sizes[plate_size]/2 + 14.3,l_offset[plate_size] - 11.5 + switch_offset * 2,-3.9]) hole("keystone2_solid");
	}
else if (3rd_plate_bottom_hole == "keystone1" && 3rd_plate != "outlet" && 3rd_plate != "toggle" && 3rd_plate != "rocker") {
	translate([height_sizes[plate_size]/2 + 28.5,l_offset[plate_size] - 11.5 + switch_offset * 2,-3.9]) hole("keystone_solid");
	}
else if (3rd_plate_bottom_hole == "keystone2" && 3rd_plate != "outlet" && 3rd_plate != "toggle" && 3rd_plate != "rocker") {
	translate([height_sizes[plate_size]/2 + 28.5,l_offset[plate_size] - 11.5 + switch_offset * 2,-3.9]) hole("keystone2_solid");
	}
}

module plate4_solid(){
if (4th_plate == "keystone1" && 4th_plate_bottom_hole == "none") {
	translate([height_sizes[plate_size]/2 + 14.3,l_offset[plate_size] - 11.5 + switch_offset * 3,-3.9]) hole("keystone_solid");
	}
else if (4th_plate == "keystone1" && 4th_plate_bottom_hole != "outlet" && 4th_plate_bottom_hole != "toggle" && 4th_plate_bottom_hole != "rocker") {
	translate([height_sizes[plate_size]/2,l_offset[plate_size] - 11.5 + switch_offset * 3,-3.9]) hole("keystone_solid");
	}
else if (4th_plate == "keystone2" && 4th_plate_bottom_hole == "none") {
	translate([height_sizes[plate_size]/2 + 14.3,l_offset[plate_size] - 11.5 + switch_offset * 3,-3.9]) hole("keystone2_solid");
	}
else if (4th_plate == "keystone2" && 4th_plate_bottom_hole != "outlet" && 4th_plate_bottom_hole != "toggle" && 5th_plate_bottom_hole != "rocker") {
	translate([height_sizes[plate_size]/2,l_offset[plate_size] - 11.5 + switch_offset * 3,-3.9]) hole("keystone2_solid");
	}
else if (4th_plate == "keystone3" && 4th_plate_bottom_hole == "none") {
	translate([height_sizes[plate_size]/2 + 14.3,l_offset[plate_size] - 11.5 + switch_offset * 3,-3.9]) hole("keystone3_solid");
	}
else if (4th_plate == "keystone6" && 4th_plate_bottom_hole == "none") {
	translate([height_sizes[plate_size]/2 + 14.3,l_offset[plate_size] - 11.5 + switch_offset * 3,-3.9]) hole("keystone6_solid");
	}
if (4th_plate_bottom_hole == "keystone1" && 4th_plate == "none") {
	translate([height_sizes[plate_size]/2 + 14.3,l_offset[plate_size] - 11.5 + switch_offset * 3,-3.9]) hole("keystone_solid");
	}
if (4th_plate_bottom_hole == "keystone2" && 4th_plate == "none") {
	translate([height_sizes[plate_size]/2 + 14.3,l_offset[plate_size] - 11.5 + switch_offset * 3,-3.9]) hole("keystone2_solid");
	}
else if (4th_plate_bottom_hole == "keystone1" && 4th_plate != "outlet" && 4th_plate != "toggle" && 4th_plate != "rocker") {
	translate([height_sizes[plate_size]/2 + 28.5,l_offset[plate_size] - 11.5 + switch_offset * 3,-3.9]) hole("keystone_solid");
	}
else if (4th_plate_bottom_hole == "keystone2" && 4th_plate != "outlet" && 4th_plate != "toggle" && 4th_plate != "rocker") {
	translate([height_sizes[plate_size]/2 + 28.5,l_offset[plate_size] - 11.5 + switch_offset * 3,-3.9]) hole("keystone2_solid");
	}
}

module plate5_solid(){
if (5th_plate == "keystone1" && 5th_plate_bottom_hole == "none") {
	translate([height_sizes[plate_size]/2 + 14.3,l_offset[plate_size] - 11.5 + switch_offset * 4,-3.9]) hole("keystone_solid");
	}
else if (5th_plate == "keystone1" && 5th_plate_bottom_hole != "outlet" && 5th_plate_bottom_hole != "toggle" && 5th_plate_bottom_hole != "rocker") {
	translate([height_sizes[plate_size]/2,l_offset[plate_size] - 11.5 + switch_offset * 4,-3.9]) hole("keystone_solid");
	}
else if (5th_plate == "keystone2" && 5th_plate_bottom_hole == "none") {
	translate([height_sizes[plate_size]/2 + 14.3,l_offset[plate_size] - 11.5 + switch_offset * 4,-3.9]) hole("keystone2_solid");
	}
else if (5th_plate == "keystone2" && 5th_plate_bottom_hole != "outlet" && 5th_plate_bottom_hole != "toggle" && 5th_plate_bottom_hole != "rocker") {
	translate([height_sizes[plate_size]/2,l_offset[plate_size] - 11.5 + switch_offset * 4,-3.9]) hole("keystone2_solid");
	}
else if (5th_plate == "keystone3" && 5th_plate_bottom_hole == "none") {
	translate([height_sizes[plate_size]/2 + 14.3,l_offset[plate_size] - 11.5 + switch_offset * 4,-3.9]) hole("keystone3_solid");
	}
else if (5th_plate == "keystone6" && 5th_plate_bottom_hole == "none") {
	translate([height_sizes[plate_size]/2 + 14.3,l_offset[plate_size] - 11.5 + switch_offset * 4,-3.9]) hole("keystone6_solid");
	}
if (5th_plate_bottom_hole == "keystone1" && 5th_plate == "none") {
	translate([height_sizes[plate_size]/2 + 14.3,l_offset[plate_size] - 11.5 + switch_offset * 4,-3.9]) hole("keystone_solid");
	}
if (5th_plate_bottom_hole == "keystone2" && 5th_plate == "none") {
	translate([height_sizes[plate_size]/2 + 14.3,l_offset[plate_size] - 11.5 + switch_offset * 4,-3.9]) hole("keystone2_solid");
	}
else if (5th_plate_bottom_hole == "keystone1" && 5th_plate != "outlet" && 5th_plate != "toggle" && 5th_plate != "rocker") {
	translate([height_sizes[plate_size]/2 + 28.5,l_offset[plate_size] - 11.5 + switch_offset * 4,-3.9]) hole("keystone_solid");
	}
else if (5th_plate_bottom_hole == "keystone2" && 5th_plate != "outlet" && 5th_plate != "toggle" && 5th_plate != "rocker") {
	translate([height_sizes[plate_size]/2 + 28.5,l_offset[plate_size] - 11.5 + switch_offset * 4,-3.9]) hole("keystone2_solid");
	}
}


  ///////////////////
 // PlateStation: //
///////////////////

//Plate size and bevel
module plate() {
	difference() {
		cube([height_sizes[plate_size],solid_plate_width,6]);
		translate([-4.3,-5,6.2]) rotate([0,45,0]) cube([6,edgewidth,6]); //Top Bevel
		translate([height_sizes[plate_size]-4.2,-5,6.25]) rotate([0,45,0]) cube([6,edgewidth,6]); //Bottom Bevel
		translate([height_sizes[plate_size]+10,-4.4,6.1]) rotate([0,45,90]) cube([6,height_sizes[plate_size]+20,6]); //Left Bevel (doesn't change)
		translate([height_sizes[plate_size]+10,rightbevel,6]) rotate([0,45,90]) cube([6,height_sizes[plate_size]+10,6]); //Right Bevel (scales right)
				}
			}


// Thinning Plate
module plate_inner() {
	scale([0.95,thinner_offset[plate_width],1]){
	translate([3,3,0]){
	difference() {
		cube([height_sizes[plate_size],solid_plate_width,6]);
		translate([-4.3,-5,6.2]) rotate([0,45,0]) cube([6,edgewidth,6]); //Top Bevel
		translate([height_sizes[plate_size]-4.2,-5,6.25]) rotate([0,45,0]) cube([6,edgewidth,6]); //Bottom Bevel
		translate([height_sizes[plate_size]+10,-4.4,6.1]) rotate([0,45,90]) cube([6,height_sizes[plate_size]+20,6]); //Left Bevel (doesn't change)
		translate([height_sizes[plate_size]+10,rightbevel,6]) rotate([0,45,90]) cube([6,height_sizes[plate_size]+10,6]); //Right Bevel (scales right)
				}
			}
		}
	}

// Box screw holes
module box_screws(){
	 translate([height_sizes[plate_size]/2 + 41.67125,0,-1]) cylinder(r=2, h=10);
	 translate([height_sizes[plate_size]/2 + 41.67125,0,3.5]) cylinder(r1=2, r2=3.3, h=3);
	 translate([height_sizes[plate_size]/2 - 41.67125,0,-1]) cylinder(r=2, h=10);
	 translate([height_sizes[plate_size]/2 - 41.67125,0,3.5]) cylinder(r1=2, r2=3.3, h=3);
}

// Rocker/Designer screw holes
module rocker_screws(){
	 translate([height_sizes[plate_size]/2 + 48.41875,0,-1]) cylinder(r=2, h=10);
	 translate([height_sizes[plate_size]/2 + 48.41875,0,3.5]) cylinder(r1=2, r2=3.3, h=3);
	 translate([height_sizes[plate_size]/2 - 48.41875,0,-1]) cylinder(r=2, h=10);
	 translate([height_sizes[plate_size]/2 - 48.41875,0,3.5]) cylinder(r1=2, r2=3.3, h=3);
}

// Toggle screw holes
module toggle_screws(){
	 translate([height_sizes[plate_size]/2 + 30.1625,0,-1]) cylinder(r=2, h=10);
	 translate([height_sizes[plate_size]/2 + 30.1625,0,3.5]) cylinder(r1=2, r2=3.3, h=3);
	 translate([height_sizes[plate_size]/2 - 30.1625,0,-1]) cylinder(r=2, h=10);
	 translate([height_sizes[plate_size]/2 - 30.1625,0,3.5]) cylinder(r1=2, r2=3.3, h=3);
}

module roundedRectangle(width, height, cornerRadius) {
    hull() {
        translate([cornerRadius, cornerRadius, 0]) circle(r=cornerRadius);
        translate([width-cornerRadius, cornerRadius, 0]) circle(r=cornerRadius);
        translate([width-cornerRadius, height-cornerRadius, 0]) circle(r=cornerRadius);
        translate([cornerRadius, height-cornerRadius, 0]) circle(r=cornerRadius);
    }
}

  ///////////////
 // Portland: //
///////////////

// Hole Cutout definitions
module hole(hole_type) {


// Toggle switch hole
	if (hole_type == "toggle") {
		translate([height_sizes[plate_size]/2,0,0]) cube([23.8125,10.3188,15], center = true);
		 						}

// Toggle switch hole and screw holes
	if (hole_type == "long_toggle") {
		translate([height_sizes[plate_size]/2,0,0]) cube([43.6563,11.9063,15], center = true);
		 						}

// Rocker switch plate
	if (hole_type == "rocker") {
		//translate([height_sizes[plate_size]/2,0,0]) cube([67.1,33.3,15], center = true);
		translate([height_sizes[plate_size]/2,0,0]) linear_extrude(15) translate([-rocker_openingY/2,-rocker_openingX/2,]) roundedRectangle(rocker_openingY, rocker_openingX, rocker_opening_cornerR);

		 						}

// Duplex power outlet plate or dual side toggles
	if (hole_type == "outlet" || hole_type == "dualsidetoggle") {
		translate([height_sizes[plate_size]/2 + 19.3915,0,0]) {
			difference() {
				cylinder(r=17.4625, h=15, center = true);
				translate([-24.2875,-15,-2]) cube([10,37,15], center = false);
				translate([14.2875,-15,-2]) cube([10,37,15], center = false);
								}
							}
		translate([height_sizes[plate_size]/2 - 19.3915,0,0]){
			difference(){
				cylinder(r=17.4625, h=15, center = true);
				translate([-24.2875,-15,-2]) cube([10,37,15], center = false);
				translate([14.2875,-15,-2]) cube([10,37,15], center = false);
								}
							}
		translate([height_sizes[plate_size]/2,0,-1]) cylinder(r=2, h=10);
		translate([height_sizes[plate_size]/2,0,3.5]) cylinder(r1=2, r2=3.3, h=3);
							}

// Blank plate
	if (hole_type == "blank") { }

// VGA & DB09 plate
// VGA Fits http://www.datapro.net/products/vga-dual-panel-mount-f-f-cable.html
// DB09 Fits http://www.datapro.net/products/db9-serial-panel-mount-male-extension.html
	if (hole_type == "vga" || hole_type == "db09") {

			translate([0,-12.5,3]) cylinder(r=1.75, h=10, center = true);
			translate([0,12.5,3]) cylinder(r=1.75, h=10, center = true);
				difference(){
					cube([10,19,13], center=true);
					translate([-5,-9.2,1]) rotate([0,0,-35.6]) cube([4.4,2.4,15], center=true);
					translate([.9,-11.2,0]) rotate([0,0,9.6]) cube([10,4.8,15], center=true);
					translate([4.6,-8.5,0]) rotate([0,0,37.2]) cube([4.4,2.4,15], center=true);
					translate([-5,9.2,1]) rotate([0,0,35.6]) cube([4.4,2.4,15], center=true);
					translate([0.9,11.2,0]) rotate([0,0,-9.6]) cube([10,4.8,15], center=true);
					translate([4.6,8.5,0]) rotate([0,0,-37.2]) cube([4.4,2.4,15], center=true);
								}
						}

// HDMI plate
// Fits http://www.datapro.net/products/hdmi-panel-mount-extension-cable.html
	if (hole_type == "hdmi") {
		translate([0,-13,3]) cylinder(r=1.75, h=10, center = true);
		translate([0,13,3]) cylinder(r=1.75, h=10, center = true);
		translate([0,0,3]) cube([6,16,10], center=true);
							}

// DVI-I plate
// Fits http://www.datapro.net/products/dvi-i-panel-mount-extension-cable.html
	if (hole_type == "dvi") {
		translate([0,-16,3]) cylinder(r=1.75, h=10, center = true);
		translate([0,16,3]) cylinder(r=1.75, h=10, center = true);
		translate([0,0,3]) cube([10,26,10], center=true);
							}

// DisplayPort plate
// Fits http://www.datapro.net/products/dvi-i-panel-mount-extension-cable.html
	if (hole_type == "displayport") {
		translate([0,-13.5,3]) cylinder(r=1.75, h=10, center = true);
		translate([0,13.5,3]) cylinder(r=1.75, h=10, center = true);
		translate([0,0,0]){
			difference(){
				translate([0,0,3]) cube([7,19,10], center=true);
				translate([2.47,-9.37,3]) rotate([0,0,-54.6]) cube([3,5,14], center=true);
						}
								}
									}

// USB-A Plate
// Fits http://www.datapro.net/products/usb-panel-mount-type-a-cable.html
	if (hole_type == "usb-a") {
		translate([0,-15,3]) cylinder(r=1.75, h=10, center = true);
		translate([0,15,3]) cylinder(r=1.75, h=10, center = true);
		translate([0,0,3]) cube([8,16,10], center=true);
							}

// USB-B Plate
// Fits http://www.datapro.net/products/usb-panel-mount-type-b-cable.html
	if (hole_type == "usb-b") {
		translate([0,-13,3]) cylinder(r=1.75, h=10, center = true);
		translate([0,13,3]) cylinder(r=1.75, h=10, center = true);
		translate([0,0,3]) cube([11,12,10], center=true);
							}

// 1394 Firewire Plate
// Fits http://www.datapro.net/products/firewire-panel-mount-extension.html
	if (hole_type == "firewire") {
		translate([0,-13.5,3]) cylinder(r=1.75, h=10, center = true);
		translate([0,13.5,3]) cylinder(r=1.75, h=10, center = true);
		translate([0,0,3]) cube([7,12,10], center=true);
							}

// F-Type / Cable TV Plate
// Fits http://www.datapro.net/products/f-type-panel-mounting-coupler.html
	if (hole_type == "f-type") {
		translate([0,0,3]) cylinder(r=4.7625, h=10, center=true);
							}

// Cat5e & Cat6 plate
// Cat5e Fits http://www.datapro.net/products/cat-5e-panel-mount-ethernet.html
// Cat6 Fits hhttp://www.datapro.net/products/cat-6-panel-mount-ethernet.html
	if (hole_type == "cat5e" || hole_type == "cat6") {
		translate([0,-12.5,3]) cylinder(r=1.75, h=10, center = true);
		translate([0,12.5,3]) cylinder(r=1.75, h=10, center = true);
		translate([0,0,3]) cube([15,15,10], center=true);
		}

// S-Video & PS2 plate
// S-Video Fits hhttp://www.datapro.net/products/cat-6-panel-mount-ethernet.html
// PS2 http://www.datapro.net/products/ps2-panel-mount-extension-cable.html
	if (hole_type == "svideo" || hole_type == "ps2") {
		translate([0,-10,3]) cylinder(r=1.75, h=10, center = true);
		translate([0,10,3]) cylinder(r=1.75, h=10, center = true);
		translate([0,0,3]) cylinder(r=5, h=10, center=true);
		}


// Stereo / 1/4" headphone jack coupler
// Stereo coupler Fits http://www.datapro.net/products/stereo-panel-mount-coupler.html
	if (hole_type == "stereo") {
		translate([0,0,3]) cylinder(r=2.985, h=10, center=true);
		}

//Keystone6 hole
//Hole for a 2x3 array of keystone jacks
    if (hole_type == "keystone6") {
        for(i=[-24.75,0,24.75]) {
            translate([i,0,0]) {
                keystone_hole(-keystone_column_offset);
                keystone_hole(keystone_column_offset);
            }
        }
    }
  
//Keystone3 hole
//Hole for a 1x3 array of keystone jacks
	if (hole_type == "keystone3") {
        for(i=[-24.75,0,24.75]) {
            translate([i,0,0]) keystone_hole(0);
        }
	}
      
    
//Keystone2 hole
//Hole for a side-by-side Keystone Jack pair
    if (hole_type == "keystone2") {
        keystone_hole(-keystone_column_offset);
        keystone_hole(keystone_column_offset);
    }

  //Keystone6_solid hole
    if (hole_type == "keystone6_solid") {
        for(i=[-24.75,0,24.75]) {
            translate([i,0,0]) {
                translate([0,-keystone_column_offset,0]) keystone_solid();
                translate([0,keystone_column_offset,0]) keystone_solid();
            }
            }
    }
  
//Keystone3_solid hole - three keystones down the middle
  if (hole_type == "keystone3_solid")
  {
    for(i=[-24.75,0,24.75])
    {
      translate([i,0,0])
      {
        translate([0,0,0]) keystone_solid();
      }
    }
  }
        
//Keystone2_solid hole
//Hole for a side-by-side Keystone Jack frame pair
  if (hole_type == "keystone2_solid") {
    translate([0,-keystone_column_offset,0]) keystone_solid();
    translate([0,keystone_column_offset,0]) keystone_solid();
  }
       
//Keystone1 hole
//Hole for 1 Keystone Jack
	if (hole_type == "keystone1") {
        keystone_hole(0);
    }

//Keystone Solid
	if (hole_type == "keystone_solid") {
        keystone_solid();
    }

//End of module "hole"
}

module keystone_hole(y_offset) {
    translate([0,y_offset,5]) {
        cube([keystone_height,keystone_width,10], center = true);
        translate([-5.5,0,0]) rotate([0, 45, 0]) cube([4,keystone_width,10], center = true);
    }
}

module keystone_solid() {
   rotate([0,0,90])
  {
    difference()
    {
      translate([2,2,.1]) cube([19,26.5,9.8]);
      translate([4-keystone_clearance/2,4-+keystone_clearance/2,0])

      {
        difference()
        {
          cube([15+keystone_clearance,22.5+keystone_clearance,10]);
          translate([-1,3,-3.40970]) rotate([45,0,0]) cube([17,2,6.5]);
          translate([-1,21.0,0]) rotate([-45,0,0]) cube([17,2,6.5]);
        }
        translate([0,1.8,0]) cube([15+keystone_clearance,19.62+keystone_clearance,5]);
      }
    }
  }
}


  ////////////////////////
 // Number One ENGAGE: //
////////////////////////

// Rotate so it sits correctly on plate (whoops) and make upside down
rotate([0,180,90]){
// put plate at 0,0,0 for easier printing
translate([-height_sizes[plate_size]/2,-solid_plate_width/2,-6]){

if (plate_width == 1) {
	difference() {
		plate();
		translate([0,0,-3]) plate_inner();
		plate1();
			}
		union() {
		plate1_solid();
		}
			}

else if (plate_width == 2) {
difference()
{
plate();
translate([0,0,-3]) plate_inner();
plate1();
plate2();
}
union() {
		plate1_solid();
		plate2_solid();
		}
}

else if (plate_width == 3) {
difference()
{
plate();
translate([0,0,-3]) plate_inner();
plate1();
plate2();
plate3();
}
union() {
		plate1_solid();
		plate2_solid();
		plate3_solid();
		}
}

else if (plate_width == 4) {
difference()
{
plate();
translate([0,0,-3]) plate_inner();
plate1();
plate2();
plate3();
plate4();
}
union() {
		plate1_solid();
		plate2_solid();
		plate3_solid();
		plate4_solid();
		}
}

else if (plate_width == 5) {
difference()
{
plate();
translate([0,0,-3]) plate_inner();
plate1();
plate2();
plate3();
plate4();
plate5();
}
union() {
		plate1_solid();
		plate2_solid();
		plate3_solid();
		plate4_solid();
		plate5_solid();
		}
}

//End Rotate
}
//End Translate
}
